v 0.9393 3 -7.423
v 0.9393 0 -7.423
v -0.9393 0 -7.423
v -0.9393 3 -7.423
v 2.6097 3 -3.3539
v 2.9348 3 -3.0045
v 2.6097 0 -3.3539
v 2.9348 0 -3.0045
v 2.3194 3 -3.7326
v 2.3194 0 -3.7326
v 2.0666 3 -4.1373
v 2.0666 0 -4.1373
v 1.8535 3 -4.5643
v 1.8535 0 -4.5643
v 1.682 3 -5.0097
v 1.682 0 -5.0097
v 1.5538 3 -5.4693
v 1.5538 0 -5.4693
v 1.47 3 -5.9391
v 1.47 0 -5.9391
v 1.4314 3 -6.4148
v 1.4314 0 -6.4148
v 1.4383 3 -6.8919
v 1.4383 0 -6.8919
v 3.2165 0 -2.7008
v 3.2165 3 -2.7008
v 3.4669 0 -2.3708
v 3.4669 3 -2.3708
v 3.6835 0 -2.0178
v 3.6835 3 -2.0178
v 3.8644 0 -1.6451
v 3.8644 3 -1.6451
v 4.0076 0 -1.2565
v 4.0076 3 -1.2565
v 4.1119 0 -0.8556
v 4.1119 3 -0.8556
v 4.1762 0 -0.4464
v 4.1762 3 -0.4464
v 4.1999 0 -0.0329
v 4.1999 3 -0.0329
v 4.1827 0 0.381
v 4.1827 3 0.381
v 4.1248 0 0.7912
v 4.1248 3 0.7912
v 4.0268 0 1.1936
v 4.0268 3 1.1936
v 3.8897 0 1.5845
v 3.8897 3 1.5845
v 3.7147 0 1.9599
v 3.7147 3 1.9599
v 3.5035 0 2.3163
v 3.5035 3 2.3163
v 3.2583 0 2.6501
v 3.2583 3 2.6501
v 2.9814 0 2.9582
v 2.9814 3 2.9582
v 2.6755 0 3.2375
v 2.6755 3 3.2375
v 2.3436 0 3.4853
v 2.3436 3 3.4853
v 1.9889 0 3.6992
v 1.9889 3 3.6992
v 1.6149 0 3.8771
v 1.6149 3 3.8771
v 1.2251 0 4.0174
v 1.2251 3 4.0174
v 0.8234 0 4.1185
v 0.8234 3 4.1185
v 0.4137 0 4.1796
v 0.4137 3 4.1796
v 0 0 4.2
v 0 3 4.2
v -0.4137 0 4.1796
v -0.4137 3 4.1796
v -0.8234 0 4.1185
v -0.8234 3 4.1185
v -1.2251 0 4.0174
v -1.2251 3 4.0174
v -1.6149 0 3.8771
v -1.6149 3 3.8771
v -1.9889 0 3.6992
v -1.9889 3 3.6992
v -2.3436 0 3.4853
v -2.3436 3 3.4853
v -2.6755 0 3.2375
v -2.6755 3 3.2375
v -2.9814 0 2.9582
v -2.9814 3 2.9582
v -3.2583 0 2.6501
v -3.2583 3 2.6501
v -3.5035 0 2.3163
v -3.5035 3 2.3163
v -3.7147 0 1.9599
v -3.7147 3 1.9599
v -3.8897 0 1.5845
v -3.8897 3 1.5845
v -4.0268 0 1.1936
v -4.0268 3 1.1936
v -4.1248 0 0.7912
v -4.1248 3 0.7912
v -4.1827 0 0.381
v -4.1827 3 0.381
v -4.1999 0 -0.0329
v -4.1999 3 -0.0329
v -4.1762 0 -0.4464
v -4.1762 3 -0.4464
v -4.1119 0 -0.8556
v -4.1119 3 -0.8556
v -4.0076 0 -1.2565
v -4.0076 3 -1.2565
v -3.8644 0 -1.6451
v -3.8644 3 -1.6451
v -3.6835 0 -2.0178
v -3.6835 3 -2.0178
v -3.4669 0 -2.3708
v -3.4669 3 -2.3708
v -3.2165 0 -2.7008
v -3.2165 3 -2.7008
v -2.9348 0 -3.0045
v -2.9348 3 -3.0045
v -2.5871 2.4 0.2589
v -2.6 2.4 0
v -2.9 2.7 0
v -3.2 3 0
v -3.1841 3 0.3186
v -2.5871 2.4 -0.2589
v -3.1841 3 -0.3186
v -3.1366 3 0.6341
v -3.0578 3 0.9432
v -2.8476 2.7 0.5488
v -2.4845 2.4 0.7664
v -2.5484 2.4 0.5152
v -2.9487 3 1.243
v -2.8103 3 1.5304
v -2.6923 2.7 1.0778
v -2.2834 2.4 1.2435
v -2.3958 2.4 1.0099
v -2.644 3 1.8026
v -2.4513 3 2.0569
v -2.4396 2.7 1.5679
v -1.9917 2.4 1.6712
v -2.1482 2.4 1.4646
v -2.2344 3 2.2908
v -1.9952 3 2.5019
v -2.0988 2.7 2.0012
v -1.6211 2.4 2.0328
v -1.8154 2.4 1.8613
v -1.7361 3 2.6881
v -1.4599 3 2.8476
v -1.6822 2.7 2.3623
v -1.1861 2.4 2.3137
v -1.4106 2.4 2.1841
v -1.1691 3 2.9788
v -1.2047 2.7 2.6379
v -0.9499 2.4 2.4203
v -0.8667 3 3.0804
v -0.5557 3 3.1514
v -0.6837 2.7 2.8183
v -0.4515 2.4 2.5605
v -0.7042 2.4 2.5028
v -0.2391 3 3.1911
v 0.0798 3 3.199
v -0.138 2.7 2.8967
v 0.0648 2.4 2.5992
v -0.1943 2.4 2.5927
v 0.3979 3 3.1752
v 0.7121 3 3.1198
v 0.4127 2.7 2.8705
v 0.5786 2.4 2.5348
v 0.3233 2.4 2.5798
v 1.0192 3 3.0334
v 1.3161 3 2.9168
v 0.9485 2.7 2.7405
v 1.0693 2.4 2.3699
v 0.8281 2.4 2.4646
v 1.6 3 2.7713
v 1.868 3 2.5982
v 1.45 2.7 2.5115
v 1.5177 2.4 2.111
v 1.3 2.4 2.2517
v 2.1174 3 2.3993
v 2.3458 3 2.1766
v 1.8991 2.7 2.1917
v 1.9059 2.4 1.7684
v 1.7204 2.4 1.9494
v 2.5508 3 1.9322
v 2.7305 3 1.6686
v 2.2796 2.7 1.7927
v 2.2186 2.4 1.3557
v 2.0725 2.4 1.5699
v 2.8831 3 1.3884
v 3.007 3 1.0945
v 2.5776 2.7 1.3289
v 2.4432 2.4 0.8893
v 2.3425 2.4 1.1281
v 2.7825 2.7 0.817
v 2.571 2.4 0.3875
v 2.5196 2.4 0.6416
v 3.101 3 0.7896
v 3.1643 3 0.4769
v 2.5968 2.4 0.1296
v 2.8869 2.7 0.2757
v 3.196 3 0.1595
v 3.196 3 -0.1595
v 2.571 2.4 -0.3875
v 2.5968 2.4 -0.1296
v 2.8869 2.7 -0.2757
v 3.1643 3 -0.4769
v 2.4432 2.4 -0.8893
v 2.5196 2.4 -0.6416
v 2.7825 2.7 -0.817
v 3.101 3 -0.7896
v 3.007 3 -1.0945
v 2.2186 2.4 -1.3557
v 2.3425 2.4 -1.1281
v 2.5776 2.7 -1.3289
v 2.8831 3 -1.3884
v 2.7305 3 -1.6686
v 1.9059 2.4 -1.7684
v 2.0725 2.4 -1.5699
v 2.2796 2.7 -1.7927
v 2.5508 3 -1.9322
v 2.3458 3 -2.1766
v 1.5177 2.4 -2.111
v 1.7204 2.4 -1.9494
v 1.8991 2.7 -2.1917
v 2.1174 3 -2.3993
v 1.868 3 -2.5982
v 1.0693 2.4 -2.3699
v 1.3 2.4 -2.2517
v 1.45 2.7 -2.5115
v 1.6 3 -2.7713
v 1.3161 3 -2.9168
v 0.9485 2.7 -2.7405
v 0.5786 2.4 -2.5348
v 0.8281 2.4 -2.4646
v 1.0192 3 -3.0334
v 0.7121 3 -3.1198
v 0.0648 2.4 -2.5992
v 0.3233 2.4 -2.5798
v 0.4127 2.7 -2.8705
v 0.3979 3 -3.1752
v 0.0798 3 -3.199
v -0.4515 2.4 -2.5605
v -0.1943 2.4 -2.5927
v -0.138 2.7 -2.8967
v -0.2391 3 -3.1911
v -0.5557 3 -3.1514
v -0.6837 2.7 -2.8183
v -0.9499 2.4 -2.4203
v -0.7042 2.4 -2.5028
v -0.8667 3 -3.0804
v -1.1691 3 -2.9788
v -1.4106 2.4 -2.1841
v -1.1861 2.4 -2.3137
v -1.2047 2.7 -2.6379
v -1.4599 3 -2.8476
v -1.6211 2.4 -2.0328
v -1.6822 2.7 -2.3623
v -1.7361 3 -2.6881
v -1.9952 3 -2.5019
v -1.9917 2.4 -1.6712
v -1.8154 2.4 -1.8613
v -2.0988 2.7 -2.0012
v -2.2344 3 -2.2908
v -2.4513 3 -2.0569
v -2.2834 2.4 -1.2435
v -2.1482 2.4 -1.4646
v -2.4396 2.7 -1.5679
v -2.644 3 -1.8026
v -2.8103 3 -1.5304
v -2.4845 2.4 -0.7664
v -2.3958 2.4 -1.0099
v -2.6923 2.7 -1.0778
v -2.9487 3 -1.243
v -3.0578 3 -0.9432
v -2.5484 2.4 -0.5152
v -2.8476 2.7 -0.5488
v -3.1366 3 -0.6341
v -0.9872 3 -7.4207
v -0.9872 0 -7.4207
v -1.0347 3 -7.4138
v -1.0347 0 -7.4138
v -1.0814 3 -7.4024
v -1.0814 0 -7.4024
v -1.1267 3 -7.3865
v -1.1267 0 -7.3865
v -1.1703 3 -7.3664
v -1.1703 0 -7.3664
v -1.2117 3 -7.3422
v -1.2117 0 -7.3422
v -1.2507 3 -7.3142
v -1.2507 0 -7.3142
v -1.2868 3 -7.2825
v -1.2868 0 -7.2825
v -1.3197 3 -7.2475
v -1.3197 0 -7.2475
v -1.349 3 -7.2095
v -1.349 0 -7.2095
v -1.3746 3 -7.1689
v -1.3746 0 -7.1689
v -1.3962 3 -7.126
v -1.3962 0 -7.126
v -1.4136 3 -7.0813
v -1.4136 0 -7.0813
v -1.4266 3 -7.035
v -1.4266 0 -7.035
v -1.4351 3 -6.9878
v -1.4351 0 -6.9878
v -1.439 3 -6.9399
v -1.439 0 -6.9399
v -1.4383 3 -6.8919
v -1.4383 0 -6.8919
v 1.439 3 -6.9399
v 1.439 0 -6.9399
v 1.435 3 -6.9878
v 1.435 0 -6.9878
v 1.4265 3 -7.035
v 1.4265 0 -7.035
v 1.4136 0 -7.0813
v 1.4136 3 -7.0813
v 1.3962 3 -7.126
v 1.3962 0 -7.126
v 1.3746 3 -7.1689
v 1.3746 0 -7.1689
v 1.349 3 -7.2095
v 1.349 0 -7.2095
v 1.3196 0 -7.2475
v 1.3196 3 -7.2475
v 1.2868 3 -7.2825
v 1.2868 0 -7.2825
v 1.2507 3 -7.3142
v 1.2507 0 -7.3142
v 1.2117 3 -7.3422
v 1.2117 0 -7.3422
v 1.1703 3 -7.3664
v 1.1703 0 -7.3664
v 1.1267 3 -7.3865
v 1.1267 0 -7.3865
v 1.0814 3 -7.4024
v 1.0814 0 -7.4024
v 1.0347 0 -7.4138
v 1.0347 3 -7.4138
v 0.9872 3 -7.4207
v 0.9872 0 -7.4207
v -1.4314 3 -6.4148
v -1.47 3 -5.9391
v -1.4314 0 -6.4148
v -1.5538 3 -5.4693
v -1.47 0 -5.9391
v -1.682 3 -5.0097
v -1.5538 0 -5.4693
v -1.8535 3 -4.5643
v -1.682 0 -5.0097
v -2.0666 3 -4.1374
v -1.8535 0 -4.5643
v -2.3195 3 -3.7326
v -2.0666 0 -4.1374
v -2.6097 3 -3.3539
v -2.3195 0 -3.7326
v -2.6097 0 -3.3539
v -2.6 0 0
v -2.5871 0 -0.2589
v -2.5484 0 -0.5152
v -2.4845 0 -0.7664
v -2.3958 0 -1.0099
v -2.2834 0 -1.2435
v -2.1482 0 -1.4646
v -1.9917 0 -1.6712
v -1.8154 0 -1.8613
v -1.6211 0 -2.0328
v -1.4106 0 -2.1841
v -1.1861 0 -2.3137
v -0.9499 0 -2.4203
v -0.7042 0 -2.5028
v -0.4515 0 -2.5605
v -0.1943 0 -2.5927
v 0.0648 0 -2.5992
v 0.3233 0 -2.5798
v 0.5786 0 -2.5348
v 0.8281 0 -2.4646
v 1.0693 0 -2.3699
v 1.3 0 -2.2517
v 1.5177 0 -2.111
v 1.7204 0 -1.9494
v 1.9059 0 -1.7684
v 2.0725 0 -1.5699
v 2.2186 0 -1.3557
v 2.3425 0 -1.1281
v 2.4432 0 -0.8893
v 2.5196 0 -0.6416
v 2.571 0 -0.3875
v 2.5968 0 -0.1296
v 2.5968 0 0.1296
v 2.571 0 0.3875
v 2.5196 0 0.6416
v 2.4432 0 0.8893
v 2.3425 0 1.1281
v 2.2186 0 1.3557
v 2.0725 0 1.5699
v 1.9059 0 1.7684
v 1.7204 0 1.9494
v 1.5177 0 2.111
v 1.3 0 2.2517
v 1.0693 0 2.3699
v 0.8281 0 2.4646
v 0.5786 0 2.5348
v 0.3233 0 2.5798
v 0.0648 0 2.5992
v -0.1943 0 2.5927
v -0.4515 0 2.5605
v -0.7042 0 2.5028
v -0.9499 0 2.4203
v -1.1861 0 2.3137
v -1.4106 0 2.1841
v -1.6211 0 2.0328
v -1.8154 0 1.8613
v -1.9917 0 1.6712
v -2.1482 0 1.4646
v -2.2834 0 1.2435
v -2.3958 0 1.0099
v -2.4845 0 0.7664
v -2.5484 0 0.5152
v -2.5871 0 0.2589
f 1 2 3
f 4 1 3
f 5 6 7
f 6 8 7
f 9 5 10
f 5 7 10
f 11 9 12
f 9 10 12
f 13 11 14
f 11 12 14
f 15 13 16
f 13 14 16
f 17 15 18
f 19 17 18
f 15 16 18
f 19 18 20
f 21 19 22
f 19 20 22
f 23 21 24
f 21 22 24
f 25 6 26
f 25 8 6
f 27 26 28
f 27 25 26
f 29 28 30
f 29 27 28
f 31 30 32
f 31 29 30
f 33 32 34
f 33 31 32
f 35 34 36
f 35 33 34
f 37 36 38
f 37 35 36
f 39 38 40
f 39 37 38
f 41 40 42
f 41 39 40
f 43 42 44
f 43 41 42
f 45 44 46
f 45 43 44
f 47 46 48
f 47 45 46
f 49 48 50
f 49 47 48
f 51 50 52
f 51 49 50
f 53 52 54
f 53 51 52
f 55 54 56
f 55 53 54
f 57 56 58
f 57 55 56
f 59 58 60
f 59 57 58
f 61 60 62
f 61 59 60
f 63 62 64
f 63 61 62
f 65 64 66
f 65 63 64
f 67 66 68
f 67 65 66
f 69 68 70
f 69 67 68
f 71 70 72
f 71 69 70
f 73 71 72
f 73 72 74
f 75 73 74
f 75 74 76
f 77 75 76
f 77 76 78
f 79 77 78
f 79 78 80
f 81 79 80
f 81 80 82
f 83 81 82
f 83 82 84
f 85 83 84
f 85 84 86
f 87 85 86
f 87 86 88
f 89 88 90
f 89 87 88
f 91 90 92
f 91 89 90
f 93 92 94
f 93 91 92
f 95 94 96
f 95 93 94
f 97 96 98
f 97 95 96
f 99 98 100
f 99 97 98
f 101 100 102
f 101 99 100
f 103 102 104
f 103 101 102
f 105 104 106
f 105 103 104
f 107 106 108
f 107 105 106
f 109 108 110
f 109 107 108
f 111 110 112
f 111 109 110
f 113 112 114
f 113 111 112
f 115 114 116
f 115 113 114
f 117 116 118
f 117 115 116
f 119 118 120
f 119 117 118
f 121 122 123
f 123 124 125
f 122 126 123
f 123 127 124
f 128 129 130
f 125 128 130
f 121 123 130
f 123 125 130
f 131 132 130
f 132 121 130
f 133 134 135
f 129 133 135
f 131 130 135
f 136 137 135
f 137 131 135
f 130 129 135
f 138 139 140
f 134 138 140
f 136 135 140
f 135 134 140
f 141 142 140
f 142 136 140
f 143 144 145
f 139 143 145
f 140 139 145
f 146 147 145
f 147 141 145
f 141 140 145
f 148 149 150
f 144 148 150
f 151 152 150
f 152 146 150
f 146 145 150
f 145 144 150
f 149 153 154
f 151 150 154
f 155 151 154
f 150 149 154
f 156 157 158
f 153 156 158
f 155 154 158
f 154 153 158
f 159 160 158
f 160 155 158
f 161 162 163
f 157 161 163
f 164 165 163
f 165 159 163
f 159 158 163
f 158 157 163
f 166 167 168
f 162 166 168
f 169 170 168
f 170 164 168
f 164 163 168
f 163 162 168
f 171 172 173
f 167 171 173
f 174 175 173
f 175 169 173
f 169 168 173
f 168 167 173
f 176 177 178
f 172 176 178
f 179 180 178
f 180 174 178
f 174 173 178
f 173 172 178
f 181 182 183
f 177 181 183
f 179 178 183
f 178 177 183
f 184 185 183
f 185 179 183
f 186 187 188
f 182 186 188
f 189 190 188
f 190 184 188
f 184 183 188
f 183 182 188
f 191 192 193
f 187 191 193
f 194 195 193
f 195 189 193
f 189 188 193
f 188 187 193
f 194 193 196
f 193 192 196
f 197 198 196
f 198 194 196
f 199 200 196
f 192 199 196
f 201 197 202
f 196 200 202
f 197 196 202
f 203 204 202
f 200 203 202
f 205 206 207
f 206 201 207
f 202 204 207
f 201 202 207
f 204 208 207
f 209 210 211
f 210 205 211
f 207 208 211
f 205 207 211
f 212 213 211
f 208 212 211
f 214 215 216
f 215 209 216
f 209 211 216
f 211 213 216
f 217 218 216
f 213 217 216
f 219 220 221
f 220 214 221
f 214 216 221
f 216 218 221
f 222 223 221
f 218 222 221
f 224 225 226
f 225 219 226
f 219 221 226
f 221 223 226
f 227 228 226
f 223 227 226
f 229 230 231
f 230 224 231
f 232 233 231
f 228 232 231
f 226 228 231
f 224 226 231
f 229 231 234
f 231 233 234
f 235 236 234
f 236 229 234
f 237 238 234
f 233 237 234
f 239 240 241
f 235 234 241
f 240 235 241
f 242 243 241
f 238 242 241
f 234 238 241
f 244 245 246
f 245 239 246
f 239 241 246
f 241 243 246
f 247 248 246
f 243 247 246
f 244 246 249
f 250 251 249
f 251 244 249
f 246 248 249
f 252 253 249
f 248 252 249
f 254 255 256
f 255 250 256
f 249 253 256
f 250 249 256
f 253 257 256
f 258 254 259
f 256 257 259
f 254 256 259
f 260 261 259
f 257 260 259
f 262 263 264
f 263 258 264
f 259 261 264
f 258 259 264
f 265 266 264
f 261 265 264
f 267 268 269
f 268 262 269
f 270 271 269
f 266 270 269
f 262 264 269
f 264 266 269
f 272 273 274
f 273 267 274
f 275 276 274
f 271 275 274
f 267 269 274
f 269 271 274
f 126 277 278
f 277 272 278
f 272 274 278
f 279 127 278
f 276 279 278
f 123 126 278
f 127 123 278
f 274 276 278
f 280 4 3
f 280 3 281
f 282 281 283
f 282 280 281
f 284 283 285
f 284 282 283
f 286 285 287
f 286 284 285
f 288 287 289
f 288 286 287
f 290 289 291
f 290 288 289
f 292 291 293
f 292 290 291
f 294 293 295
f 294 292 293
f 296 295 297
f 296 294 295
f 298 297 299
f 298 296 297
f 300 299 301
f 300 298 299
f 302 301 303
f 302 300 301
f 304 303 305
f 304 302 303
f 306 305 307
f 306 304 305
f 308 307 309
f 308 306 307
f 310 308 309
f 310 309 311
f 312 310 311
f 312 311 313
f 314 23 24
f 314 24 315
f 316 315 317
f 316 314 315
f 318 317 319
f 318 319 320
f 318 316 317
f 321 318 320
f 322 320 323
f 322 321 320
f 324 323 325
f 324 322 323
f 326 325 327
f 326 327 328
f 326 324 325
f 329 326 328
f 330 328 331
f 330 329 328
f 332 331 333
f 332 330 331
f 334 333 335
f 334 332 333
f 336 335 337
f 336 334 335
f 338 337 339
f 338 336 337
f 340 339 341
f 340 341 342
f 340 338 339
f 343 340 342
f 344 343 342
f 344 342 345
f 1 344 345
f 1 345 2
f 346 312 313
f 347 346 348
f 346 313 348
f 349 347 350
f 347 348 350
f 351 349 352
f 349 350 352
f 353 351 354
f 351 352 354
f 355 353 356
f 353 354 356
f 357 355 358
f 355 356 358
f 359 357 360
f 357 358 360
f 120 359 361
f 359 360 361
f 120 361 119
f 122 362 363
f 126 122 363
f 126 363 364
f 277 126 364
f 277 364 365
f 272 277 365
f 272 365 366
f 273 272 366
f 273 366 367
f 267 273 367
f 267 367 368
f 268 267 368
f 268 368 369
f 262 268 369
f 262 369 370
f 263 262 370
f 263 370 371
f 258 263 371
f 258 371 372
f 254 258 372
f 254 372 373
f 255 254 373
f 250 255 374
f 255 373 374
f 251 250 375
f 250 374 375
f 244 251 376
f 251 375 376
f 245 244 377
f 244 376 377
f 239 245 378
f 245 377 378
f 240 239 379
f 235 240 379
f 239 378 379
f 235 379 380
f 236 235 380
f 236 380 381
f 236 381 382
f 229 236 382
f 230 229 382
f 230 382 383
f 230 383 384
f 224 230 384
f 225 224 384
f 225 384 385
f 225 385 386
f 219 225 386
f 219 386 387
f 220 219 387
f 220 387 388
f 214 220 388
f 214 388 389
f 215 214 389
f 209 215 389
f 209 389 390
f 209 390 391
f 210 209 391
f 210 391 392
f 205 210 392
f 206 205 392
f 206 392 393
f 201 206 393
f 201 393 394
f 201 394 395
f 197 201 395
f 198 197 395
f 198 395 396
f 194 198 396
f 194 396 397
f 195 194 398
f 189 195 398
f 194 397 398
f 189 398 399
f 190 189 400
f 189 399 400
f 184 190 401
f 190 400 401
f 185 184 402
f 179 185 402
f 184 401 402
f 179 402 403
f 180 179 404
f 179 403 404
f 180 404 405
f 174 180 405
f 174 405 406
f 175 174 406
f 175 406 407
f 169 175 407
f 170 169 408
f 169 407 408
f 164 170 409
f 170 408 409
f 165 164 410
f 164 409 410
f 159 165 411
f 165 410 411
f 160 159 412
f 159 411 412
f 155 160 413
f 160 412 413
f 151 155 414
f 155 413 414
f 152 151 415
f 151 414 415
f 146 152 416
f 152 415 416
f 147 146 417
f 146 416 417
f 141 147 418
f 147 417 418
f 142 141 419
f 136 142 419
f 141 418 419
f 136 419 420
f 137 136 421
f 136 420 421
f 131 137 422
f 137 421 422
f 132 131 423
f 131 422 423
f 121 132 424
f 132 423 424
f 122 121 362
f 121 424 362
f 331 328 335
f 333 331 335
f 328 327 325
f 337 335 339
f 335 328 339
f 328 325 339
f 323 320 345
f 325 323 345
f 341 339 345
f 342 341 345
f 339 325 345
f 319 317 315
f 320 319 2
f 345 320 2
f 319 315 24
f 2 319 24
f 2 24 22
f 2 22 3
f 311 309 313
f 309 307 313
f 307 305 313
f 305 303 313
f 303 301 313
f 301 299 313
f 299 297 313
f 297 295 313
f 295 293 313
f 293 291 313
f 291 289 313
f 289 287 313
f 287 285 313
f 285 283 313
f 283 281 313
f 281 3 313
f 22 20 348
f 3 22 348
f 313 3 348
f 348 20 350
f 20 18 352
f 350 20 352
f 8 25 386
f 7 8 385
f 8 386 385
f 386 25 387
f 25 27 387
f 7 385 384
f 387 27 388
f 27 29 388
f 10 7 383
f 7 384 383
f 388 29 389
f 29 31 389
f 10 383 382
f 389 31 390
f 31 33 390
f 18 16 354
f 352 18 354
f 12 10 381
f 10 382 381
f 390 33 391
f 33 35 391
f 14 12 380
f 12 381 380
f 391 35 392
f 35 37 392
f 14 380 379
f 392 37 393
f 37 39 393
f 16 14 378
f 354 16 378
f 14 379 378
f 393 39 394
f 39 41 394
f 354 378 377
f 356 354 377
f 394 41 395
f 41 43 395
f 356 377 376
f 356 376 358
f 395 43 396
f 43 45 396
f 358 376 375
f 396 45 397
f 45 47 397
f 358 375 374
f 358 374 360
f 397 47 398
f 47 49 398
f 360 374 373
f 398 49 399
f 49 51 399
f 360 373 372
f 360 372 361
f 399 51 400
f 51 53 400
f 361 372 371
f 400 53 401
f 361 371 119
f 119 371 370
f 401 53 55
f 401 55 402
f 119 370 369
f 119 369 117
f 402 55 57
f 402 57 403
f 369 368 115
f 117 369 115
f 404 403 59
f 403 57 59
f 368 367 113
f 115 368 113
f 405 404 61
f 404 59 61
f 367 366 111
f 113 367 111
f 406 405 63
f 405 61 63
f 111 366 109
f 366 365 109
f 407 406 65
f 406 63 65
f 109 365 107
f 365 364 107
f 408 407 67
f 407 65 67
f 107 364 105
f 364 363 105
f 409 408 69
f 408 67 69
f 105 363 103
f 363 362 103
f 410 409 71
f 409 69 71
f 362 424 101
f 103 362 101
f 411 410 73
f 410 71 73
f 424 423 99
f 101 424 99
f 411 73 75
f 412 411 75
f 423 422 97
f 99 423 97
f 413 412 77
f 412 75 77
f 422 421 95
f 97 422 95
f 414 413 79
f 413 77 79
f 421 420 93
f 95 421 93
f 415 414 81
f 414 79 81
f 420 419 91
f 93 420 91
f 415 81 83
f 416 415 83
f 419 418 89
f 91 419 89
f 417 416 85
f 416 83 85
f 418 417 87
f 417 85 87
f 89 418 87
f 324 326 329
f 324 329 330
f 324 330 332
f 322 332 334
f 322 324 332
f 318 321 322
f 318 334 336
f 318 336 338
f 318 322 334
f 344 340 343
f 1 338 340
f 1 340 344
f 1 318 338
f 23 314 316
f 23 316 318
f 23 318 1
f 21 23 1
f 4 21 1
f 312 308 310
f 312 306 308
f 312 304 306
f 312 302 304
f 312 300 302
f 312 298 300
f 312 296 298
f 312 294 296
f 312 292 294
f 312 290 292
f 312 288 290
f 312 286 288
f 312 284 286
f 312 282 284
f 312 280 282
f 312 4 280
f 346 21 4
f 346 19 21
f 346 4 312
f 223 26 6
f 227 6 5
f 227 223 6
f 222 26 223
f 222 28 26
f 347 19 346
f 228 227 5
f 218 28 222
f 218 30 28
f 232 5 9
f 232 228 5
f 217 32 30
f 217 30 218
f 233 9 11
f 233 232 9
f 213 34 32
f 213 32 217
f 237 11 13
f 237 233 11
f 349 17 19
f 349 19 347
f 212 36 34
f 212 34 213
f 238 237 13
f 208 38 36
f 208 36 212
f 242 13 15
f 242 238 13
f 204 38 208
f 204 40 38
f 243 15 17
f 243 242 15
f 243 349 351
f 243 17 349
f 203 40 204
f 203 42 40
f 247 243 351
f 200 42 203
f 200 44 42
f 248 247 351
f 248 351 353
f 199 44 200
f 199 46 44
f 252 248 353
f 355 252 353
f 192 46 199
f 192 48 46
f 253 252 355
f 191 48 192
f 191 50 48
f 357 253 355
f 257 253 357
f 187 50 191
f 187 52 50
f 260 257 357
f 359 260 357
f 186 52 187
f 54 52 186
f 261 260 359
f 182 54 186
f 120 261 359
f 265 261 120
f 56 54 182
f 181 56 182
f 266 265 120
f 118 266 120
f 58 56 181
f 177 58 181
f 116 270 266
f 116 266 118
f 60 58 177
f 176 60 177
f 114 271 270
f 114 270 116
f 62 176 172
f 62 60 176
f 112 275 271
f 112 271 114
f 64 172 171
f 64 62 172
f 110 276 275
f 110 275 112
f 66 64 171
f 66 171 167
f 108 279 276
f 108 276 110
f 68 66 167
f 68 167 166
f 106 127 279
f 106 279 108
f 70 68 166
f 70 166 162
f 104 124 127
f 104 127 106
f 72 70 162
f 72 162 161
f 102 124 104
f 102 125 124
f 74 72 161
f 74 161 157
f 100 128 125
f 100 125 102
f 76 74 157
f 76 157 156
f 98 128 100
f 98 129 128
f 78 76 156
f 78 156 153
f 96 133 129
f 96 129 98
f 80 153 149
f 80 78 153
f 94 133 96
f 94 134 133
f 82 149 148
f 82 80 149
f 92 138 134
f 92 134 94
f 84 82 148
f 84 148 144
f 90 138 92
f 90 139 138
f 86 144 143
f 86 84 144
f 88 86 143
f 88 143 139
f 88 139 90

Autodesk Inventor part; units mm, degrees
ref_plane "YZ Plane" through (0, 0, 0) normal (1, 0, 0) x (0, 1, 0)
ref_plane "XZ Plane" through (0, 0, 0) normal (0, 1, 0) x (-1, 0, 0)
ref_plane "XY Plane" through (0, 0, 0) normal (0, 0, 1) x (1, 0, 0)
sketch "Sketch1" plane through (0, 0, 0) normal (0, 1, 0) x (-1, 0, 0)
  circle A0 centre (0, 0) radius 2.6
  circle A1 centre (0, 0) radius 4.2
  line L0 (1.5, -3.923) -> (-1.5, -3.923)
  line L1 (-1.5, -3.923) -> (-1.5, -7.423)
  line L2 (-1.5, -7.423) -> (1.5, -7.423)
  line L3 (1.5, -7.423) -> (1.5, -3.923)
  line L4 (0, 0) -> (0, -7.423)
  arc A2 (2.9348, -3.0045) -> (1.5, -7.423) centre (6.4286, -6.5812) ccw
  arc A3 (-1.5, -7.423) -> (-2.9348, -3.0045) centre (-6.4286, -6.5812) ccw
  point P0 (1.5, -7.423)
  point P1 (-1.5, -5.7395)
  dimension "d0" = 5.2
  dimension "d1" = 1.6
  dimension "d2" = 1.5
  dimension "d3" = 3.5
  dimension "d4" = 5
  dimension "d6" = 5
extrude "Extrusion1" add sketch "Sketch1" along normal blind 3 contours A1 L0 | A1 L1 A3 | A2 L3 A1 | L0 L4 A1 | A1 L4 L2 A3 L1 | L3 A2 L2 L4 A1 | A1 L4 L0
fillet "Fillet2" radius 0.5 2 edges at (1.5, 1.5, -7.423) (-1.5, 1.5, -7.423)
chamfer "Chamfer1" distance 0.6 angle 45 1 edges at (2.6, 3, 0)
equation "\"d0\" = d"
equation "\"d6\" = d4"
equation "\"d7\" = dep"
equation "\"d\" = 5.2"
equation "\"dep\" = 3"
properties part number "thumbscrew_converter_M3"
